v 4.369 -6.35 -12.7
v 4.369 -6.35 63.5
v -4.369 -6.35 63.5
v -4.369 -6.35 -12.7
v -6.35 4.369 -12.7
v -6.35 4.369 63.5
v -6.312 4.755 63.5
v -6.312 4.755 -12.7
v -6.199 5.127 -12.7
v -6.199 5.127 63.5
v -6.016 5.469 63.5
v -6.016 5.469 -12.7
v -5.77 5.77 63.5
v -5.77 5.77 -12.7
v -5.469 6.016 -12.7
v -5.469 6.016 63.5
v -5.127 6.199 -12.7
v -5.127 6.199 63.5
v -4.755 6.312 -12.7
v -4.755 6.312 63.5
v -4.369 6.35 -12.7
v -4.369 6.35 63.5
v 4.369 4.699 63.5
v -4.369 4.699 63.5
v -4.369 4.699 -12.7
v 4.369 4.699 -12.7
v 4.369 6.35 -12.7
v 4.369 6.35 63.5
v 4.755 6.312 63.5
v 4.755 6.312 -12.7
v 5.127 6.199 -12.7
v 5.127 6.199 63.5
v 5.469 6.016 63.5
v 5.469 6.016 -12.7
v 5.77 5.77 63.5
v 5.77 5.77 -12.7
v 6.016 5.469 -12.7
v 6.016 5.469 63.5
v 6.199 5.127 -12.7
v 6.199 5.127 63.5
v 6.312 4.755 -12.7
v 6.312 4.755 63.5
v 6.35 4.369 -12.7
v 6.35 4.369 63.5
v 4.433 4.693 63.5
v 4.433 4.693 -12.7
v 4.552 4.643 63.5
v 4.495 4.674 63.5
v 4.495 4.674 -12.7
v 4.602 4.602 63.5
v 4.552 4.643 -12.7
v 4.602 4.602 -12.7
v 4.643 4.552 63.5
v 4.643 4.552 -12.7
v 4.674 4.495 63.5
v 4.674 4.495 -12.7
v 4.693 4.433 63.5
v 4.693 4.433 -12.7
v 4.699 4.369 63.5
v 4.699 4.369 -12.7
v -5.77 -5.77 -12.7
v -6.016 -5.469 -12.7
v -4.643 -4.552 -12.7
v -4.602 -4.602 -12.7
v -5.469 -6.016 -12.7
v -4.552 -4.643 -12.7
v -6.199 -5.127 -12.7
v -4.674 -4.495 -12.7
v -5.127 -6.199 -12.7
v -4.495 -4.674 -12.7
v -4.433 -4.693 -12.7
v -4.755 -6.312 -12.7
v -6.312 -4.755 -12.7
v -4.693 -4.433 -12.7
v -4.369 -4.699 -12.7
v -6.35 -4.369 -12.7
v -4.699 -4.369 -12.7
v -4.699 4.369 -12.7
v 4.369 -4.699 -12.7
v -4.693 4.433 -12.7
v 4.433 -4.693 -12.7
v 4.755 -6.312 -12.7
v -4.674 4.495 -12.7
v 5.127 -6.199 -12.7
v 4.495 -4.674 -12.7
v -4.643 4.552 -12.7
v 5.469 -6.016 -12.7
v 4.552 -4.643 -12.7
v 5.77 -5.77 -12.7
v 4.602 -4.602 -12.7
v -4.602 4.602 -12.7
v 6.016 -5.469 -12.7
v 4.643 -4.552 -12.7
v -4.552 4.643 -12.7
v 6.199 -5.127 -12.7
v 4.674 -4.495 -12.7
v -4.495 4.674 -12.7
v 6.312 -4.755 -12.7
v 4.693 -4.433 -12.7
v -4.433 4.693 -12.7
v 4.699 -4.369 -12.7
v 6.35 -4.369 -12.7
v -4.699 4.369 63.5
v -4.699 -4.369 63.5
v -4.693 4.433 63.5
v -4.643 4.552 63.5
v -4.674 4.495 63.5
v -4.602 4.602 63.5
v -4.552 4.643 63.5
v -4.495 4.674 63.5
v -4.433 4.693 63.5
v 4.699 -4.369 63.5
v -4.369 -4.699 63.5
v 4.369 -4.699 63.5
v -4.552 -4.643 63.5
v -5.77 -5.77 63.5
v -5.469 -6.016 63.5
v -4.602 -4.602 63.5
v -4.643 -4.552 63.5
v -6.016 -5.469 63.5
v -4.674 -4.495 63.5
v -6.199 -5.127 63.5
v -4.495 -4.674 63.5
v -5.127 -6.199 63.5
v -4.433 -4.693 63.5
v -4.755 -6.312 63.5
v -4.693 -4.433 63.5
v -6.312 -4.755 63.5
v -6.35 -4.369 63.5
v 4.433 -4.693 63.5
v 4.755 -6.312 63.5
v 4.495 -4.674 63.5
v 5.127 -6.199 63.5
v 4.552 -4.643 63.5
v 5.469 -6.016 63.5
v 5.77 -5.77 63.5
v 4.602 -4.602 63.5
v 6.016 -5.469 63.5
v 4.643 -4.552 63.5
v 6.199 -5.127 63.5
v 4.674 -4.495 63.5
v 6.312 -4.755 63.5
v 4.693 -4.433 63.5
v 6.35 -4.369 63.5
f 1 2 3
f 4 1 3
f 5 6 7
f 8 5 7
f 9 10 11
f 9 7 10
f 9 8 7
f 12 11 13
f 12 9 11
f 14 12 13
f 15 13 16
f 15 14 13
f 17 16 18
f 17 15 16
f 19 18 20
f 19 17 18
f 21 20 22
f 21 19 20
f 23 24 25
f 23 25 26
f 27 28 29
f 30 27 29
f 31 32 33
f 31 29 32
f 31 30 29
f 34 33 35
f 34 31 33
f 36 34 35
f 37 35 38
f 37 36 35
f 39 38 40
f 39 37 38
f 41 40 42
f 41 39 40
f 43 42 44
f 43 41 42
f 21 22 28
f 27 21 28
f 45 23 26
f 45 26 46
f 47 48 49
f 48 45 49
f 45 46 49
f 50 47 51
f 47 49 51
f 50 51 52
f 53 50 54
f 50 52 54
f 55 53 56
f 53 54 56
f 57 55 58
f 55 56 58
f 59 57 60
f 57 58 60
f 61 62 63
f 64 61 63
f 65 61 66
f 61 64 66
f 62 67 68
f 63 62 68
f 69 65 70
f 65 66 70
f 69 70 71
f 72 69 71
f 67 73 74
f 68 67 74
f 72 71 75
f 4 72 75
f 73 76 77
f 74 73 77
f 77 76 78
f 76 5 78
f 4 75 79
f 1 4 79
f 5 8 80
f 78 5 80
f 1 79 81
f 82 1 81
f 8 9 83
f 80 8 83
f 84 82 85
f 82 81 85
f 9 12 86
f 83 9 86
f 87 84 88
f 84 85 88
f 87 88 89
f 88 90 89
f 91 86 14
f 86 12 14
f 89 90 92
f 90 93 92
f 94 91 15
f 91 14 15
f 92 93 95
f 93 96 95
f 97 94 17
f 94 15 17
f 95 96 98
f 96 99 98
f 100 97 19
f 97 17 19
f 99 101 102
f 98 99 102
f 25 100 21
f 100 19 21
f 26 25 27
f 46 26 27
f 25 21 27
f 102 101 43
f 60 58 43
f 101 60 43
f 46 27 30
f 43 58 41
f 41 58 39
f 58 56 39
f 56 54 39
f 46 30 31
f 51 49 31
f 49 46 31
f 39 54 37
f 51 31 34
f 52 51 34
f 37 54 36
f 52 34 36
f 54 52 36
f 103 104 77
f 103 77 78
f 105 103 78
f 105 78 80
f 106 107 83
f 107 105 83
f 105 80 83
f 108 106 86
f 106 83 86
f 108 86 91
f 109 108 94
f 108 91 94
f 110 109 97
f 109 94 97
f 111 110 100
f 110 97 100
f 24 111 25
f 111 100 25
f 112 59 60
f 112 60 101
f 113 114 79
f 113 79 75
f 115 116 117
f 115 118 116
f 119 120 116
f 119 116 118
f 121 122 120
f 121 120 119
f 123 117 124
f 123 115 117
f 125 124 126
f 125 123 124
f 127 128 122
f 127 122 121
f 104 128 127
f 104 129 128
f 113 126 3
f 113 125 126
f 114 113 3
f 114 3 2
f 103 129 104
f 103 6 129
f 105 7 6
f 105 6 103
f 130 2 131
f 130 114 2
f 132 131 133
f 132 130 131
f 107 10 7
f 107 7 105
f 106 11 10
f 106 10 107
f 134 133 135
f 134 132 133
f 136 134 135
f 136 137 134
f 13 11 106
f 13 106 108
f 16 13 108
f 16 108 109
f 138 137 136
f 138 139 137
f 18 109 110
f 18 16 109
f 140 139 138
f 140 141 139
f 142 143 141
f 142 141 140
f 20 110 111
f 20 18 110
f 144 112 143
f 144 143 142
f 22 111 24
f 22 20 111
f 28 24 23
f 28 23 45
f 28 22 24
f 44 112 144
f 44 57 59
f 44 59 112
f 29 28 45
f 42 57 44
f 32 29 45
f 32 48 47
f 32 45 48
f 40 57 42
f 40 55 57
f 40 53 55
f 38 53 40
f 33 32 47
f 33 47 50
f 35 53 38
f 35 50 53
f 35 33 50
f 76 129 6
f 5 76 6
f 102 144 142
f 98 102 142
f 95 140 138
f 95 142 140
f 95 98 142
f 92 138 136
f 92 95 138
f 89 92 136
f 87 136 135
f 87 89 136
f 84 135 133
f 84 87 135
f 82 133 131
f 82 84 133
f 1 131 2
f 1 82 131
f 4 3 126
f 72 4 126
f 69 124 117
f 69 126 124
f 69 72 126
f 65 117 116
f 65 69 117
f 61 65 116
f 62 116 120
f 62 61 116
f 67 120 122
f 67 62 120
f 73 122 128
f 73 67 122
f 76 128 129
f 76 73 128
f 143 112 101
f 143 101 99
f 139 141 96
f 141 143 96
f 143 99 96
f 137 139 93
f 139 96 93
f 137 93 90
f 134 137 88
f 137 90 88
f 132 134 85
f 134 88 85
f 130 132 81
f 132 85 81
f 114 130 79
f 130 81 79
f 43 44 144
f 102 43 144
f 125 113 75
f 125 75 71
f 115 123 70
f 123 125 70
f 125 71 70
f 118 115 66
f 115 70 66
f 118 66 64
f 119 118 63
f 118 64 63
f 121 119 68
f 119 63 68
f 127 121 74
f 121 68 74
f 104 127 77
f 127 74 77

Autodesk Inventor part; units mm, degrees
ref_plane "Start plane" through (0, 0, -12.7) normal (0, 0, 1) x (1, 0, 0)
ref_plane "End plane" through (0, 0, 63.5) normal (0, 0, 1) x (1, 0, 0)
sketch "Sketch" plane through (0, 0, 0) normal (0, 0, 1) x (1, 0, 0)
  line L0 (-6.35, -4.3688) -> (-6.35, 4.3688)
  line L1 (-4.3688, 6.35) -> (4.3688, 6.35)
  line L2 (6.35, 4.3688) -> (6.35, -4.3688)
  line L3 (4.3688, -6.35) -> (-4.3688, -6.35)
  arc A0 (-6.35, -4.3688) -> (-4.3688, -6.35) centre (-4.3688, -4.3688) ccw
  arc A1 (-4.3688, 6.35) -> (-6.35, 4.3688) centre (-4.3688, 4.3688) ccw
  arc A2 (6.35, 4.3688) -> (4.3688, 6.35) centre (4.3688, 4.3688) ccw
  arc A3 (4.3688, -6.35) -> (6.35, -4.3688) centre (4.3688, -4.3688) ccw
  arc A4 (-4.3688, 4.699) -> (-4.699, 4.3688) centre (-4.3688, 4.3688) ccw
  line L4 (-4.3688, 4.699) -> (4.3688, 4.699)
  arc A5 (4.699, 4.3688) -> (4.3688, 4.699) centre (4.3688, 4.3688) ccw
  line L5 (4.699, 4.3688) -> (4.699, -4.3688)
  arc A6 (4.3688, -4.699) -> (4.699, -4.3688) centre (4.3688, -4.3688) ccw
  line L6 (4.3688, -4.699) -> (-4.3688, -4.699)
  arc A7 (-4.699, -4.3688) -> (-4.3688, -4.699) centre (-4.3688, -4.3688) ccw
  line L7 (-4.699, -4.3688) -> (-4.699, 4.3688)
  line L8 (0, 9.4644) -> (0, -9.4644) construction
  line L9 (-10.1124, 0) -> (13.3521, 0) construction
  dimension "d10" = 12.7
  dimension "d11" = 12.7
  dimension "d12" = 1.651
  dimension "d15" = 6.35
  dimension "d16" = 6.35
  dimension "d17" = 1.9812
extrude "Body" add sketch "Sketch" along normal up to surface (76.2 mm away) from surface at -12.7
sketch "Sketch3" plane through (0, 0, 0) normal (0, 0, 1) x (1, 0, 0)
  line L0 (0, 0) -> (10, 0)
ref_plane "Work Plane3" through (0, 0, 0) normal (0, -1, 0) x (1, 0, 0)
sketch "Sketch4" plane through (0, 0, 0) normal (0, -1, 0) x (1, 0, 0)
  line L0 (-2, -12.7) -> (12, -12.7)
  line L1 (-2, 63.5) -> (12, 63.5)
  dimension "d19" = 76.2
ref_plane "Work Plane4" through (6.35, -17.0688, -12.7) normal (0, 0, -1) x (-1, 0, 0)
split "Split1" plane through (6.35, -17.0688, -12.7) removes the side toward (0, 0, -1)
ref_plane "Work Plane5" through (6.35, -8.3312, 63.5) normal (0, 0, 1) x (1, 0, 0)
split "Split2" plane through (6.35, -8.3312, 63.5) removes the side toward (0, 0, 1)
equation "\"d10\" = G_H"
equation "\"d11\" = G_W"
equation "\"d12\" = G_T"
equation "\"d15\" = 0.5 * d10"
equation "\"d16\" = 0.5 * d11"
equation "\"d17\" = G_IR"
equation "\"d3\" = G_L"
equation "\"G_W\" = 12.7"
equation "\"G_H\" = 12.7"
equation "\"G_T\" = 1.651"
equation "\"G_IR\" = 1.2 * G_T"
equation "\"G_L\" = d19"
equation "\"G_OFFSET_START\" = 12.7"
equation "\"G_OFFSET_END\" = 12.7"
equation "\"d13\" = -G_OFFSET_START"
equation "\"d14\" = G_OFFSET_END + B_L"
equation "\"B_L\" = 50.8"
properties part number "ASTM A513 - 1/2 x 1/2 x 13/200 - 3" material "Steel, Mild"
